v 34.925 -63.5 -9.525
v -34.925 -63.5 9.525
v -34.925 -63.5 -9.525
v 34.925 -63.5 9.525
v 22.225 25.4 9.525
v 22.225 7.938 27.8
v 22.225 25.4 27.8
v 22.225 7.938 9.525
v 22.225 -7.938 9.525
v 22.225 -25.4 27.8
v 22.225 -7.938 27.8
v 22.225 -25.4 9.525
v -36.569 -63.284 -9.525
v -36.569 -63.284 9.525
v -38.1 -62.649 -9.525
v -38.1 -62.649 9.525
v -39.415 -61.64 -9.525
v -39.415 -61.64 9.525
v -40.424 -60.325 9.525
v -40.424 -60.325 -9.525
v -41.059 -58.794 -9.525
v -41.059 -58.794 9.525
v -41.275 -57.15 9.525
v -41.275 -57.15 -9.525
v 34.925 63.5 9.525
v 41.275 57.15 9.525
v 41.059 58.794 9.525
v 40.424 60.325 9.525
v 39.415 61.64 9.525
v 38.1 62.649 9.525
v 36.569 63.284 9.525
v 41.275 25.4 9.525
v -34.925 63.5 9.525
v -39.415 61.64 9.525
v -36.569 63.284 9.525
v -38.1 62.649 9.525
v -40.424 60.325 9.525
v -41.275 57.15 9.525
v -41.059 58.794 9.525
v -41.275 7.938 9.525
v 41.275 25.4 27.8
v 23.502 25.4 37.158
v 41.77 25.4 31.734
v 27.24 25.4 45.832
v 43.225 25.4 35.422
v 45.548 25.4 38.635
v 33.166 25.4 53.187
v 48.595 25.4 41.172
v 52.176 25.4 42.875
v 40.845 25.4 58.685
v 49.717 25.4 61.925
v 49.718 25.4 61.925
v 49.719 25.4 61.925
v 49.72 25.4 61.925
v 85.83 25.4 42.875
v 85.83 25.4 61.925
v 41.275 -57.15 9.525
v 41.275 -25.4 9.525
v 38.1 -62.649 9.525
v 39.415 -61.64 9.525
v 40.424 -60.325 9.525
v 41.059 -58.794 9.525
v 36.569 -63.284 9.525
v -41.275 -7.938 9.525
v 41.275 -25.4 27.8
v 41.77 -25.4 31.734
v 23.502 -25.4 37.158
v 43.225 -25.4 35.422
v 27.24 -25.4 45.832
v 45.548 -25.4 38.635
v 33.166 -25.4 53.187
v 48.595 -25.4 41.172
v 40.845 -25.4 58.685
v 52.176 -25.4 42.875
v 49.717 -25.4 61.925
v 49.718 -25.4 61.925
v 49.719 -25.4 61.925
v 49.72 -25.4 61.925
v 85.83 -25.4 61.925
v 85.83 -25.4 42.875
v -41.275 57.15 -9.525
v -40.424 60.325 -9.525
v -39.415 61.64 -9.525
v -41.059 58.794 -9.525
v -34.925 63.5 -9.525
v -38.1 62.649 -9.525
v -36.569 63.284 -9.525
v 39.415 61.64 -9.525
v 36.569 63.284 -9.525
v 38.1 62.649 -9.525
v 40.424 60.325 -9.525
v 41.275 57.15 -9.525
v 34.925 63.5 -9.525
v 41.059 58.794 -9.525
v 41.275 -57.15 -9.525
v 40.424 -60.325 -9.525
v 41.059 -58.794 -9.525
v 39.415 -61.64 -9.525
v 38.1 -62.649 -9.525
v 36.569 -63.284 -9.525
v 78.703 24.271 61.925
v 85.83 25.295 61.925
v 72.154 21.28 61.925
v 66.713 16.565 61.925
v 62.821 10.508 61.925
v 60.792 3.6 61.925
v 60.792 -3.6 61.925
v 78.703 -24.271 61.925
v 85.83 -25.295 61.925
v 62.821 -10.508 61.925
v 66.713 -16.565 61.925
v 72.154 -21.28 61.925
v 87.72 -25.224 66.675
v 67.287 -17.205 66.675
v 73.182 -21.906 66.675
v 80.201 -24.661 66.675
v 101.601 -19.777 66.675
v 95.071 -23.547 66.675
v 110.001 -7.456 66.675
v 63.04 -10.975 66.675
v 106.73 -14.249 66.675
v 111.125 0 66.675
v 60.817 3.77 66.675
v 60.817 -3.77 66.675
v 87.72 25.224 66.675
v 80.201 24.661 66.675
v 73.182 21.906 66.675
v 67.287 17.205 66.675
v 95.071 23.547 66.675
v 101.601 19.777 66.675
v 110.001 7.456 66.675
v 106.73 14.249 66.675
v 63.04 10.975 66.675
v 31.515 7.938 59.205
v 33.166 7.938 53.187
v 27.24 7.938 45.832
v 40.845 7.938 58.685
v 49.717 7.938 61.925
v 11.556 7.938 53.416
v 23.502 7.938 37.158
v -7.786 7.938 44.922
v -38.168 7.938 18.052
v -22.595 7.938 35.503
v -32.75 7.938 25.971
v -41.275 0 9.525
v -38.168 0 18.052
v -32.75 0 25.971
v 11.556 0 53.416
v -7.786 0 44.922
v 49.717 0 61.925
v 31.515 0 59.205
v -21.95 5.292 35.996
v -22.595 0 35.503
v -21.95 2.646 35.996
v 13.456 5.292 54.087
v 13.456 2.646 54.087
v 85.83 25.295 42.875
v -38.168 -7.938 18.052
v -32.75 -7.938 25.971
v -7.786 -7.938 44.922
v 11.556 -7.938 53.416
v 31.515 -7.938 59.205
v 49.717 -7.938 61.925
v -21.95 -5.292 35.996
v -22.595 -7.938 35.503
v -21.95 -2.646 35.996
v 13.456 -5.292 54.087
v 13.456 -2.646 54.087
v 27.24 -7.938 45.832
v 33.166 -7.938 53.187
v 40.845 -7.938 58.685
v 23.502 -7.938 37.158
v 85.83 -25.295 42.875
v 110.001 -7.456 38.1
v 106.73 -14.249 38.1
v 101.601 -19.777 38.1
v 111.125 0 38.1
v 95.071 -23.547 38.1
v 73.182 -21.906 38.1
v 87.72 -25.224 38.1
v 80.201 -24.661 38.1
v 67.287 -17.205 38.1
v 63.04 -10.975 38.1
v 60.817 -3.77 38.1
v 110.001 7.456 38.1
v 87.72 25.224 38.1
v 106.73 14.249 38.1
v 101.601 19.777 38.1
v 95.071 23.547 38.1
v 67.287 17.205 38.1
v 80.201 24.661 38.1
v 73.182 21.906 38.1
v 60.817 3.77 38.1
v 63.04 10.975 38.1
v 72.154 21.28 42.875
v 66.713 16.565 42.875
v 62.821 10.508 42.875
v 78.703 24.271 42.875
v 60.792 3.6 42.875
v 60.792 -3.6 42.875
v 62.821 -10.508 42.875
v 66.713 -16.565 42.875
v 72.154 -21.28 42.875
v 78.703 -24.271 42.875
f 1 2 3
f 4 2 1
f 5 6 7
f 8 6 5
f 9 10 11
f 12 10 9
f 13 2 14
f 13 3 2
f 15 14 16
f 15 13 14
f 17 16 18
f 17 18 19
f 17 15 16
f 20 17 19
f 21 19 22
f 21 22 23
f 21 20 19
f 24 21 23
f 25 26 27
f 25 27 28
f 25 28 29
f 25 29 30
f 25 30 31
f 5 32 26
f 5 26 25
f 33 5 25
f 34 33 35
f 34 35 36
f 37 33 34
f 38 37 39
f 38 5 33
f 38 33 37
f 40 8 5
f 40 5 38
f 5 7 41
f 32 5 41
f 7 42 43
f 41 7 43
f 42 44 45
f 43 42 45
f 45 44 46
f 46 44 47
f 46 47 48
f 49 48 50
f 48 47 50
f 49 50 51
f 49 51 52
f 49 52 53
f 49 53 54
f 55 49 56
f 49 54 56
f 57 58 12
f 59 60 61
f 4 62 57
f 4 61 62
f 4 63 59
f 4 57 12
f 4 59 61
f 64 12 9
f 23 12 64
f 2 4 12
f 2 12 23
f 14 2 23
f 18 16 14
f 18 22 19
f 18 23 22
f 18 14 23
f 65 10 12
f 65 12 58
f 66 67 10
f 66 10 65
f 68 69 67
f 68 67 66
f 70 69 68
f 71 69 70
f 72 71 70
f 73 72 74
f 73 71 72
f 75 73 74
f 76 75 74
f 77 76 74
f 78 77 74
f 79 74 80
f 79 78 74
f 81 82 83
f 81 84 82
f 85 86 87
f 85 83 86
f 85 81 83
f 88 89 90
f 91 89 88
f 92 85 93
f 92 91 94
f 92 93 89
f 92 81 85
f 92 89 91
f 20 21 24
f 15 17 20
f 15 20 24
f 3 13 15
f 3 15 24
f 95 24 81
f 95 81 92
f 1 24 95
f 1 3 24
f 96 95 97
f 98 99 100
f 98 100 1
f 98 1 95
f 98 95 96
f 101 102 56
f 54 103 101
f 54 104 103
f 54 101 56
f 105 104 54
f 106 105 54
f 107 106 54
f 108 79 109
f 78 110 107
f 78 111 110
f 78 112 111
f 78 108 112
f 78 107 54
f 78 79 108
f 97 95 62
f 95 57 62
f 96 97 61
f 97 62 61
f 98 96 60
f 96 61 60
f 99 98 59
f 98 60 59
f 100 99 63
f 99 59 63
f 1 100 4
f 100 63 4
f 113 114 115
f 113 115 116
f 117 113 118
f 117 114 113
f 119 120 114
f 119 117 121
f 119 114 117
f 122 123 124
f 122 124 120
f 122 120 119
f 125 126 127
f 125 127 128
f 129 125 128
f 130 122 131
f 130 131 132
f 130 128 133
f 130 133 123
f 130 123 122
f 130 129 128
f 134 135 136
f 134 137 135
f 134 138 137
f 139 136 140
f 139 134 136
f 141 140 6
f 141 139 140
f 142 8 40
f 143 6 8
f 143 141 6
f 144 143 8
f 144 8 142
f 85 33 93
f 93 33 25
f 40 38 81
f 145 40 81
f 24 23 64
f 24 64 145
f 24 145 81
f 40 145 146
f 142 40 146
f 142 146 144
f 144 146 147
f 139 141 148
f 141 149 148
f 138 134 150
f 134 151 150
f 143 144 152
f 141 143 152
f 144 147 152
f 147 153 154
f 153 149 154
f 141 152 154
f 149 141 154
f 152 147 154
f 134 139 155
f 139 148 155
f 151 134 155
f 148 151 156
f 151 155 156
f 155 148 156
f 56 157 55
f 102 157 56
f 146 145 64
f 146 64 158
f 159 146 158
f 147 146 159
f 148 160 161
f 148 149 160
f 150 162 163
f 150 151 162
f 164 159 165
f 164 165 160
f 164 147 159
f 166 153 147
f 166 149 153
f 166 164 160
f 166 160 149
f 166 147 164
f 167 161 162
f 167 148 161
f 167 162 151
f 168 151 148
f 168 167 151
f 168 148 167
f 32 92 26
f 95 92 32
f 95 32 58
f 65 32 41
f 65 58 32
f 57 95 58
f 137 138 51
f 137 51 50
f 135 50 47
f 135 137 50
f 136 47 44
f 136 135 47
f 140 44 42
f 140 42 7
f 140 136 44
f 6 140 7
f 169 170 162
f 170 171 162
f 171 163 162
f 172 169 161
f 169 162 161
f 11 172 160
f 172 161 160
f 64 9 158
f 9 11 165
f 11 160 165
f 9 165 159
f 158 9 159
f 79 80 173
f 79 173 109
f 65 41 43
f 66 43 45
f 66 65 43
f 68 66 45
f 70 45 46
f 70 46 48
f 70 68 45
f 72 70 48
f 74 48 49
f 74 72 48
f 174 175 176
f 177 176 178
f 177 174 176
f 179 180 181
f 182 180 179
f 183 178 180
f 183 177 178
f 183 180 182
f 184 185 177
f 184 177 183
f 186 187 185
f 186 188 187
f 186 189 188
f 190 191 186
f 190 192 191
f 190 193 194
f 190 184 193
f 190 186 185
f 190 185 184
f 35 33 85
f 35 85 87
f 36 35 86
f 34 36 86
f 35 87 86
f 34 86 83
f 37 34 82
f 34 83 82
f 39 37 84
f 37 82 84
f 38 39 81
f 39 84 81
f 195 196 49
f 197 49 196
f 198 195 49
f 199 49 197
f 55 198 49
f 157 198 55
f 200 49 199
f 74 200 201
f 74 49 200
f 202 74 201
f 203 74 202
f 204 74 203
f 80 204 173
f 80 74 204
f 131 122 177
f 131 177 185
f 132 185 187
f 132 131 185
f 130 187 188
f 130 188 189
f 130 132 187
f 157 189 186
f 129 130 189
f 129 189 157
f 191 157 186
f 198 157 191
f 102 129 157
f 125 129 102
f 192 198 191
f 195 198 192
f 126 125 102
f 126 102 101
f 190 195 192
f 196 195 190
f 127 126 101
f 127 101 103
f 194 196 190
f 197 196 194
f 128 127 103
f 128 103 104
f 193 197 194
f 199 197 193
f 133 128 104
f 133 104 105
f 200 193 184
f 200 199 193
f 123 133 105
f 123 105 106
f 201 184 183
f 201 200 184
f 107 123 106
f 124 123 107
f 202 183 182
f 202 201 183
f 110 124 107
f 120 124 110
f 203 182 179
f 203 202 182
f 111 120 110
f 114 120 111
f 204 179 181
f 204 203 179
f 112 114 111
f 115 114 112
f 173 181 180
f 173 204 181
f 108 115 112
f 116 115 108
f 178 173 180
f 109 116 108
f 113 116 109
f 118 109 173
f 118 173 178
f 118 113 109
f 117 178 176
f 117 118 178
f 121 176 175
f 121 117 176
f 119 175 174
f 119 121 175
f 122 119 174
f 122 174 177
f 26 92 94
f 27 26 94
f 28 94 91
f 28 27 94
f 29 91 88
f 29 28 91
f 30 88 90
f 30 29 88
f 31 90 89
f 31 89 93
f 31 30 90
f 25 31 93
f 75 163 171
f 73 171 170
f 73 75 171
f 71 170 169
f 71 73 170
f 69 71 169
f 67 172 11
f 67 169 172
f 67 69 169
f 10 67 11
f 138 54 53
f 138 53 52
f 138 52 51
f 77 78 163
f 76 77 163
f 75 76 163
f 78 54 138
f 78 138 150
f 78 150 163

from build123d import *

# Parameters (mm, degrees)
F1_DEPTH = 63.5
F0_W     = 25.5048689127
F0_H     = 19.05
F2_DEPTH = 25.4
F3_DEPTH = 7.9375
F5_R     = 6.35


with BuildPart() as f1:
    # F0 (on Front) → F1 (new body, symmetric)
    with BuildSketch(Plane.XZ):
        Polygon((22.225, 9.525), (-41.275, 9.525), (-41.275, -9.525), (41.275, -9.525), (41.275, 9.525), align=None)
    extrude(amount=F1_DEPTH, both=True)

    # F0 (on Front) → F2 (join, symmetric)
    with BuildSketch(Plane.XZ):
        with BuildLine():
            Line((22.225, 27.7996848035), (22.225, 9.525))
            Line((22.225, 9.525), (41.275, 9.525))
            Line((41.275, 9.525), (41.275, 27.7996848035))
            ThreePointArc((41.275, 27.7996848035), (44.2856320844, 37.1014944732), (52.1756189772, 42.8752))
            Line((52.1756189772, 42.8752), (60.325, 42.8752))
            Line((60.325, 42.8752), (60.325, 61.9252))
            Line((60.325, 61.9252), (49.7200042009, 61.9252))
            ThreePointArc((49.7200042009, 61.9252), (49.7186139898, 61.9248972859), (49.717223791, 61.9245945151))
            ThreePointArc((49.717223791, 61.9245945151), (29.9530761473, 49.7104802695), (22.225, 27.7996848035))
        make_face()
        with Locations((73.0774344563, 52.4002)):
            Rectangle(F0_W, F0_H)
    extrude(amount=F2_DEPTH, both=True)

    # F0 (on Front) → F3 (join, symmetric)
    with BuildSketch(Plane.XZ):
        with BuildLine():
            add(Edge.make_bspline(
                [(-41.275, 9.525), (-35.0649054053, 39.5606108994), (18.1036447727, 59.8387115969), (49.717223791, 61.9245945151)],
                knots=[0, 0, 0, 0, 105.000862147, 105.000862147, 105.000862147, 105.000862147], degree=3))
            Line((-41.275, 9.525), (22.225, 9.525))
            Line((22.225, 9.525), (22.225, 27.7996848035))
            ThreePointArc((22.225, 27.7996848035), (29.9530761473, 49.7104802695), (49.717223791, 61.9245945151))
        make_face()
    extrude(amount=F3_DEPTH, both=True)

    # F0 (on Front) → F4 (revolve)
    with BuildSketch(Plane.XZ):
        Polygon((85.8298689127, 66.675), (85.8298689127, 61.9252), (85.8298689127, 42.8752), (85.8298689127, 38.1), (111.125, 38.1), (111.125, 66.675), align=None)
    revolve(axis=Axis((85.8298689127, 0, 52.3875), (0, 0, 1)))

    # F5
    f5_edges = [f1.edges().sort_by_distance(p)[0] for p in [
        (41.275, 63.5, 0),
        (-41.275, 63.5, 0),
        (-41.275, -63.5, 0),
        (41.275, -63.5, 0),
    ]]
    fillet(f5_edges, radius=F5_R)


solid = f1.part
